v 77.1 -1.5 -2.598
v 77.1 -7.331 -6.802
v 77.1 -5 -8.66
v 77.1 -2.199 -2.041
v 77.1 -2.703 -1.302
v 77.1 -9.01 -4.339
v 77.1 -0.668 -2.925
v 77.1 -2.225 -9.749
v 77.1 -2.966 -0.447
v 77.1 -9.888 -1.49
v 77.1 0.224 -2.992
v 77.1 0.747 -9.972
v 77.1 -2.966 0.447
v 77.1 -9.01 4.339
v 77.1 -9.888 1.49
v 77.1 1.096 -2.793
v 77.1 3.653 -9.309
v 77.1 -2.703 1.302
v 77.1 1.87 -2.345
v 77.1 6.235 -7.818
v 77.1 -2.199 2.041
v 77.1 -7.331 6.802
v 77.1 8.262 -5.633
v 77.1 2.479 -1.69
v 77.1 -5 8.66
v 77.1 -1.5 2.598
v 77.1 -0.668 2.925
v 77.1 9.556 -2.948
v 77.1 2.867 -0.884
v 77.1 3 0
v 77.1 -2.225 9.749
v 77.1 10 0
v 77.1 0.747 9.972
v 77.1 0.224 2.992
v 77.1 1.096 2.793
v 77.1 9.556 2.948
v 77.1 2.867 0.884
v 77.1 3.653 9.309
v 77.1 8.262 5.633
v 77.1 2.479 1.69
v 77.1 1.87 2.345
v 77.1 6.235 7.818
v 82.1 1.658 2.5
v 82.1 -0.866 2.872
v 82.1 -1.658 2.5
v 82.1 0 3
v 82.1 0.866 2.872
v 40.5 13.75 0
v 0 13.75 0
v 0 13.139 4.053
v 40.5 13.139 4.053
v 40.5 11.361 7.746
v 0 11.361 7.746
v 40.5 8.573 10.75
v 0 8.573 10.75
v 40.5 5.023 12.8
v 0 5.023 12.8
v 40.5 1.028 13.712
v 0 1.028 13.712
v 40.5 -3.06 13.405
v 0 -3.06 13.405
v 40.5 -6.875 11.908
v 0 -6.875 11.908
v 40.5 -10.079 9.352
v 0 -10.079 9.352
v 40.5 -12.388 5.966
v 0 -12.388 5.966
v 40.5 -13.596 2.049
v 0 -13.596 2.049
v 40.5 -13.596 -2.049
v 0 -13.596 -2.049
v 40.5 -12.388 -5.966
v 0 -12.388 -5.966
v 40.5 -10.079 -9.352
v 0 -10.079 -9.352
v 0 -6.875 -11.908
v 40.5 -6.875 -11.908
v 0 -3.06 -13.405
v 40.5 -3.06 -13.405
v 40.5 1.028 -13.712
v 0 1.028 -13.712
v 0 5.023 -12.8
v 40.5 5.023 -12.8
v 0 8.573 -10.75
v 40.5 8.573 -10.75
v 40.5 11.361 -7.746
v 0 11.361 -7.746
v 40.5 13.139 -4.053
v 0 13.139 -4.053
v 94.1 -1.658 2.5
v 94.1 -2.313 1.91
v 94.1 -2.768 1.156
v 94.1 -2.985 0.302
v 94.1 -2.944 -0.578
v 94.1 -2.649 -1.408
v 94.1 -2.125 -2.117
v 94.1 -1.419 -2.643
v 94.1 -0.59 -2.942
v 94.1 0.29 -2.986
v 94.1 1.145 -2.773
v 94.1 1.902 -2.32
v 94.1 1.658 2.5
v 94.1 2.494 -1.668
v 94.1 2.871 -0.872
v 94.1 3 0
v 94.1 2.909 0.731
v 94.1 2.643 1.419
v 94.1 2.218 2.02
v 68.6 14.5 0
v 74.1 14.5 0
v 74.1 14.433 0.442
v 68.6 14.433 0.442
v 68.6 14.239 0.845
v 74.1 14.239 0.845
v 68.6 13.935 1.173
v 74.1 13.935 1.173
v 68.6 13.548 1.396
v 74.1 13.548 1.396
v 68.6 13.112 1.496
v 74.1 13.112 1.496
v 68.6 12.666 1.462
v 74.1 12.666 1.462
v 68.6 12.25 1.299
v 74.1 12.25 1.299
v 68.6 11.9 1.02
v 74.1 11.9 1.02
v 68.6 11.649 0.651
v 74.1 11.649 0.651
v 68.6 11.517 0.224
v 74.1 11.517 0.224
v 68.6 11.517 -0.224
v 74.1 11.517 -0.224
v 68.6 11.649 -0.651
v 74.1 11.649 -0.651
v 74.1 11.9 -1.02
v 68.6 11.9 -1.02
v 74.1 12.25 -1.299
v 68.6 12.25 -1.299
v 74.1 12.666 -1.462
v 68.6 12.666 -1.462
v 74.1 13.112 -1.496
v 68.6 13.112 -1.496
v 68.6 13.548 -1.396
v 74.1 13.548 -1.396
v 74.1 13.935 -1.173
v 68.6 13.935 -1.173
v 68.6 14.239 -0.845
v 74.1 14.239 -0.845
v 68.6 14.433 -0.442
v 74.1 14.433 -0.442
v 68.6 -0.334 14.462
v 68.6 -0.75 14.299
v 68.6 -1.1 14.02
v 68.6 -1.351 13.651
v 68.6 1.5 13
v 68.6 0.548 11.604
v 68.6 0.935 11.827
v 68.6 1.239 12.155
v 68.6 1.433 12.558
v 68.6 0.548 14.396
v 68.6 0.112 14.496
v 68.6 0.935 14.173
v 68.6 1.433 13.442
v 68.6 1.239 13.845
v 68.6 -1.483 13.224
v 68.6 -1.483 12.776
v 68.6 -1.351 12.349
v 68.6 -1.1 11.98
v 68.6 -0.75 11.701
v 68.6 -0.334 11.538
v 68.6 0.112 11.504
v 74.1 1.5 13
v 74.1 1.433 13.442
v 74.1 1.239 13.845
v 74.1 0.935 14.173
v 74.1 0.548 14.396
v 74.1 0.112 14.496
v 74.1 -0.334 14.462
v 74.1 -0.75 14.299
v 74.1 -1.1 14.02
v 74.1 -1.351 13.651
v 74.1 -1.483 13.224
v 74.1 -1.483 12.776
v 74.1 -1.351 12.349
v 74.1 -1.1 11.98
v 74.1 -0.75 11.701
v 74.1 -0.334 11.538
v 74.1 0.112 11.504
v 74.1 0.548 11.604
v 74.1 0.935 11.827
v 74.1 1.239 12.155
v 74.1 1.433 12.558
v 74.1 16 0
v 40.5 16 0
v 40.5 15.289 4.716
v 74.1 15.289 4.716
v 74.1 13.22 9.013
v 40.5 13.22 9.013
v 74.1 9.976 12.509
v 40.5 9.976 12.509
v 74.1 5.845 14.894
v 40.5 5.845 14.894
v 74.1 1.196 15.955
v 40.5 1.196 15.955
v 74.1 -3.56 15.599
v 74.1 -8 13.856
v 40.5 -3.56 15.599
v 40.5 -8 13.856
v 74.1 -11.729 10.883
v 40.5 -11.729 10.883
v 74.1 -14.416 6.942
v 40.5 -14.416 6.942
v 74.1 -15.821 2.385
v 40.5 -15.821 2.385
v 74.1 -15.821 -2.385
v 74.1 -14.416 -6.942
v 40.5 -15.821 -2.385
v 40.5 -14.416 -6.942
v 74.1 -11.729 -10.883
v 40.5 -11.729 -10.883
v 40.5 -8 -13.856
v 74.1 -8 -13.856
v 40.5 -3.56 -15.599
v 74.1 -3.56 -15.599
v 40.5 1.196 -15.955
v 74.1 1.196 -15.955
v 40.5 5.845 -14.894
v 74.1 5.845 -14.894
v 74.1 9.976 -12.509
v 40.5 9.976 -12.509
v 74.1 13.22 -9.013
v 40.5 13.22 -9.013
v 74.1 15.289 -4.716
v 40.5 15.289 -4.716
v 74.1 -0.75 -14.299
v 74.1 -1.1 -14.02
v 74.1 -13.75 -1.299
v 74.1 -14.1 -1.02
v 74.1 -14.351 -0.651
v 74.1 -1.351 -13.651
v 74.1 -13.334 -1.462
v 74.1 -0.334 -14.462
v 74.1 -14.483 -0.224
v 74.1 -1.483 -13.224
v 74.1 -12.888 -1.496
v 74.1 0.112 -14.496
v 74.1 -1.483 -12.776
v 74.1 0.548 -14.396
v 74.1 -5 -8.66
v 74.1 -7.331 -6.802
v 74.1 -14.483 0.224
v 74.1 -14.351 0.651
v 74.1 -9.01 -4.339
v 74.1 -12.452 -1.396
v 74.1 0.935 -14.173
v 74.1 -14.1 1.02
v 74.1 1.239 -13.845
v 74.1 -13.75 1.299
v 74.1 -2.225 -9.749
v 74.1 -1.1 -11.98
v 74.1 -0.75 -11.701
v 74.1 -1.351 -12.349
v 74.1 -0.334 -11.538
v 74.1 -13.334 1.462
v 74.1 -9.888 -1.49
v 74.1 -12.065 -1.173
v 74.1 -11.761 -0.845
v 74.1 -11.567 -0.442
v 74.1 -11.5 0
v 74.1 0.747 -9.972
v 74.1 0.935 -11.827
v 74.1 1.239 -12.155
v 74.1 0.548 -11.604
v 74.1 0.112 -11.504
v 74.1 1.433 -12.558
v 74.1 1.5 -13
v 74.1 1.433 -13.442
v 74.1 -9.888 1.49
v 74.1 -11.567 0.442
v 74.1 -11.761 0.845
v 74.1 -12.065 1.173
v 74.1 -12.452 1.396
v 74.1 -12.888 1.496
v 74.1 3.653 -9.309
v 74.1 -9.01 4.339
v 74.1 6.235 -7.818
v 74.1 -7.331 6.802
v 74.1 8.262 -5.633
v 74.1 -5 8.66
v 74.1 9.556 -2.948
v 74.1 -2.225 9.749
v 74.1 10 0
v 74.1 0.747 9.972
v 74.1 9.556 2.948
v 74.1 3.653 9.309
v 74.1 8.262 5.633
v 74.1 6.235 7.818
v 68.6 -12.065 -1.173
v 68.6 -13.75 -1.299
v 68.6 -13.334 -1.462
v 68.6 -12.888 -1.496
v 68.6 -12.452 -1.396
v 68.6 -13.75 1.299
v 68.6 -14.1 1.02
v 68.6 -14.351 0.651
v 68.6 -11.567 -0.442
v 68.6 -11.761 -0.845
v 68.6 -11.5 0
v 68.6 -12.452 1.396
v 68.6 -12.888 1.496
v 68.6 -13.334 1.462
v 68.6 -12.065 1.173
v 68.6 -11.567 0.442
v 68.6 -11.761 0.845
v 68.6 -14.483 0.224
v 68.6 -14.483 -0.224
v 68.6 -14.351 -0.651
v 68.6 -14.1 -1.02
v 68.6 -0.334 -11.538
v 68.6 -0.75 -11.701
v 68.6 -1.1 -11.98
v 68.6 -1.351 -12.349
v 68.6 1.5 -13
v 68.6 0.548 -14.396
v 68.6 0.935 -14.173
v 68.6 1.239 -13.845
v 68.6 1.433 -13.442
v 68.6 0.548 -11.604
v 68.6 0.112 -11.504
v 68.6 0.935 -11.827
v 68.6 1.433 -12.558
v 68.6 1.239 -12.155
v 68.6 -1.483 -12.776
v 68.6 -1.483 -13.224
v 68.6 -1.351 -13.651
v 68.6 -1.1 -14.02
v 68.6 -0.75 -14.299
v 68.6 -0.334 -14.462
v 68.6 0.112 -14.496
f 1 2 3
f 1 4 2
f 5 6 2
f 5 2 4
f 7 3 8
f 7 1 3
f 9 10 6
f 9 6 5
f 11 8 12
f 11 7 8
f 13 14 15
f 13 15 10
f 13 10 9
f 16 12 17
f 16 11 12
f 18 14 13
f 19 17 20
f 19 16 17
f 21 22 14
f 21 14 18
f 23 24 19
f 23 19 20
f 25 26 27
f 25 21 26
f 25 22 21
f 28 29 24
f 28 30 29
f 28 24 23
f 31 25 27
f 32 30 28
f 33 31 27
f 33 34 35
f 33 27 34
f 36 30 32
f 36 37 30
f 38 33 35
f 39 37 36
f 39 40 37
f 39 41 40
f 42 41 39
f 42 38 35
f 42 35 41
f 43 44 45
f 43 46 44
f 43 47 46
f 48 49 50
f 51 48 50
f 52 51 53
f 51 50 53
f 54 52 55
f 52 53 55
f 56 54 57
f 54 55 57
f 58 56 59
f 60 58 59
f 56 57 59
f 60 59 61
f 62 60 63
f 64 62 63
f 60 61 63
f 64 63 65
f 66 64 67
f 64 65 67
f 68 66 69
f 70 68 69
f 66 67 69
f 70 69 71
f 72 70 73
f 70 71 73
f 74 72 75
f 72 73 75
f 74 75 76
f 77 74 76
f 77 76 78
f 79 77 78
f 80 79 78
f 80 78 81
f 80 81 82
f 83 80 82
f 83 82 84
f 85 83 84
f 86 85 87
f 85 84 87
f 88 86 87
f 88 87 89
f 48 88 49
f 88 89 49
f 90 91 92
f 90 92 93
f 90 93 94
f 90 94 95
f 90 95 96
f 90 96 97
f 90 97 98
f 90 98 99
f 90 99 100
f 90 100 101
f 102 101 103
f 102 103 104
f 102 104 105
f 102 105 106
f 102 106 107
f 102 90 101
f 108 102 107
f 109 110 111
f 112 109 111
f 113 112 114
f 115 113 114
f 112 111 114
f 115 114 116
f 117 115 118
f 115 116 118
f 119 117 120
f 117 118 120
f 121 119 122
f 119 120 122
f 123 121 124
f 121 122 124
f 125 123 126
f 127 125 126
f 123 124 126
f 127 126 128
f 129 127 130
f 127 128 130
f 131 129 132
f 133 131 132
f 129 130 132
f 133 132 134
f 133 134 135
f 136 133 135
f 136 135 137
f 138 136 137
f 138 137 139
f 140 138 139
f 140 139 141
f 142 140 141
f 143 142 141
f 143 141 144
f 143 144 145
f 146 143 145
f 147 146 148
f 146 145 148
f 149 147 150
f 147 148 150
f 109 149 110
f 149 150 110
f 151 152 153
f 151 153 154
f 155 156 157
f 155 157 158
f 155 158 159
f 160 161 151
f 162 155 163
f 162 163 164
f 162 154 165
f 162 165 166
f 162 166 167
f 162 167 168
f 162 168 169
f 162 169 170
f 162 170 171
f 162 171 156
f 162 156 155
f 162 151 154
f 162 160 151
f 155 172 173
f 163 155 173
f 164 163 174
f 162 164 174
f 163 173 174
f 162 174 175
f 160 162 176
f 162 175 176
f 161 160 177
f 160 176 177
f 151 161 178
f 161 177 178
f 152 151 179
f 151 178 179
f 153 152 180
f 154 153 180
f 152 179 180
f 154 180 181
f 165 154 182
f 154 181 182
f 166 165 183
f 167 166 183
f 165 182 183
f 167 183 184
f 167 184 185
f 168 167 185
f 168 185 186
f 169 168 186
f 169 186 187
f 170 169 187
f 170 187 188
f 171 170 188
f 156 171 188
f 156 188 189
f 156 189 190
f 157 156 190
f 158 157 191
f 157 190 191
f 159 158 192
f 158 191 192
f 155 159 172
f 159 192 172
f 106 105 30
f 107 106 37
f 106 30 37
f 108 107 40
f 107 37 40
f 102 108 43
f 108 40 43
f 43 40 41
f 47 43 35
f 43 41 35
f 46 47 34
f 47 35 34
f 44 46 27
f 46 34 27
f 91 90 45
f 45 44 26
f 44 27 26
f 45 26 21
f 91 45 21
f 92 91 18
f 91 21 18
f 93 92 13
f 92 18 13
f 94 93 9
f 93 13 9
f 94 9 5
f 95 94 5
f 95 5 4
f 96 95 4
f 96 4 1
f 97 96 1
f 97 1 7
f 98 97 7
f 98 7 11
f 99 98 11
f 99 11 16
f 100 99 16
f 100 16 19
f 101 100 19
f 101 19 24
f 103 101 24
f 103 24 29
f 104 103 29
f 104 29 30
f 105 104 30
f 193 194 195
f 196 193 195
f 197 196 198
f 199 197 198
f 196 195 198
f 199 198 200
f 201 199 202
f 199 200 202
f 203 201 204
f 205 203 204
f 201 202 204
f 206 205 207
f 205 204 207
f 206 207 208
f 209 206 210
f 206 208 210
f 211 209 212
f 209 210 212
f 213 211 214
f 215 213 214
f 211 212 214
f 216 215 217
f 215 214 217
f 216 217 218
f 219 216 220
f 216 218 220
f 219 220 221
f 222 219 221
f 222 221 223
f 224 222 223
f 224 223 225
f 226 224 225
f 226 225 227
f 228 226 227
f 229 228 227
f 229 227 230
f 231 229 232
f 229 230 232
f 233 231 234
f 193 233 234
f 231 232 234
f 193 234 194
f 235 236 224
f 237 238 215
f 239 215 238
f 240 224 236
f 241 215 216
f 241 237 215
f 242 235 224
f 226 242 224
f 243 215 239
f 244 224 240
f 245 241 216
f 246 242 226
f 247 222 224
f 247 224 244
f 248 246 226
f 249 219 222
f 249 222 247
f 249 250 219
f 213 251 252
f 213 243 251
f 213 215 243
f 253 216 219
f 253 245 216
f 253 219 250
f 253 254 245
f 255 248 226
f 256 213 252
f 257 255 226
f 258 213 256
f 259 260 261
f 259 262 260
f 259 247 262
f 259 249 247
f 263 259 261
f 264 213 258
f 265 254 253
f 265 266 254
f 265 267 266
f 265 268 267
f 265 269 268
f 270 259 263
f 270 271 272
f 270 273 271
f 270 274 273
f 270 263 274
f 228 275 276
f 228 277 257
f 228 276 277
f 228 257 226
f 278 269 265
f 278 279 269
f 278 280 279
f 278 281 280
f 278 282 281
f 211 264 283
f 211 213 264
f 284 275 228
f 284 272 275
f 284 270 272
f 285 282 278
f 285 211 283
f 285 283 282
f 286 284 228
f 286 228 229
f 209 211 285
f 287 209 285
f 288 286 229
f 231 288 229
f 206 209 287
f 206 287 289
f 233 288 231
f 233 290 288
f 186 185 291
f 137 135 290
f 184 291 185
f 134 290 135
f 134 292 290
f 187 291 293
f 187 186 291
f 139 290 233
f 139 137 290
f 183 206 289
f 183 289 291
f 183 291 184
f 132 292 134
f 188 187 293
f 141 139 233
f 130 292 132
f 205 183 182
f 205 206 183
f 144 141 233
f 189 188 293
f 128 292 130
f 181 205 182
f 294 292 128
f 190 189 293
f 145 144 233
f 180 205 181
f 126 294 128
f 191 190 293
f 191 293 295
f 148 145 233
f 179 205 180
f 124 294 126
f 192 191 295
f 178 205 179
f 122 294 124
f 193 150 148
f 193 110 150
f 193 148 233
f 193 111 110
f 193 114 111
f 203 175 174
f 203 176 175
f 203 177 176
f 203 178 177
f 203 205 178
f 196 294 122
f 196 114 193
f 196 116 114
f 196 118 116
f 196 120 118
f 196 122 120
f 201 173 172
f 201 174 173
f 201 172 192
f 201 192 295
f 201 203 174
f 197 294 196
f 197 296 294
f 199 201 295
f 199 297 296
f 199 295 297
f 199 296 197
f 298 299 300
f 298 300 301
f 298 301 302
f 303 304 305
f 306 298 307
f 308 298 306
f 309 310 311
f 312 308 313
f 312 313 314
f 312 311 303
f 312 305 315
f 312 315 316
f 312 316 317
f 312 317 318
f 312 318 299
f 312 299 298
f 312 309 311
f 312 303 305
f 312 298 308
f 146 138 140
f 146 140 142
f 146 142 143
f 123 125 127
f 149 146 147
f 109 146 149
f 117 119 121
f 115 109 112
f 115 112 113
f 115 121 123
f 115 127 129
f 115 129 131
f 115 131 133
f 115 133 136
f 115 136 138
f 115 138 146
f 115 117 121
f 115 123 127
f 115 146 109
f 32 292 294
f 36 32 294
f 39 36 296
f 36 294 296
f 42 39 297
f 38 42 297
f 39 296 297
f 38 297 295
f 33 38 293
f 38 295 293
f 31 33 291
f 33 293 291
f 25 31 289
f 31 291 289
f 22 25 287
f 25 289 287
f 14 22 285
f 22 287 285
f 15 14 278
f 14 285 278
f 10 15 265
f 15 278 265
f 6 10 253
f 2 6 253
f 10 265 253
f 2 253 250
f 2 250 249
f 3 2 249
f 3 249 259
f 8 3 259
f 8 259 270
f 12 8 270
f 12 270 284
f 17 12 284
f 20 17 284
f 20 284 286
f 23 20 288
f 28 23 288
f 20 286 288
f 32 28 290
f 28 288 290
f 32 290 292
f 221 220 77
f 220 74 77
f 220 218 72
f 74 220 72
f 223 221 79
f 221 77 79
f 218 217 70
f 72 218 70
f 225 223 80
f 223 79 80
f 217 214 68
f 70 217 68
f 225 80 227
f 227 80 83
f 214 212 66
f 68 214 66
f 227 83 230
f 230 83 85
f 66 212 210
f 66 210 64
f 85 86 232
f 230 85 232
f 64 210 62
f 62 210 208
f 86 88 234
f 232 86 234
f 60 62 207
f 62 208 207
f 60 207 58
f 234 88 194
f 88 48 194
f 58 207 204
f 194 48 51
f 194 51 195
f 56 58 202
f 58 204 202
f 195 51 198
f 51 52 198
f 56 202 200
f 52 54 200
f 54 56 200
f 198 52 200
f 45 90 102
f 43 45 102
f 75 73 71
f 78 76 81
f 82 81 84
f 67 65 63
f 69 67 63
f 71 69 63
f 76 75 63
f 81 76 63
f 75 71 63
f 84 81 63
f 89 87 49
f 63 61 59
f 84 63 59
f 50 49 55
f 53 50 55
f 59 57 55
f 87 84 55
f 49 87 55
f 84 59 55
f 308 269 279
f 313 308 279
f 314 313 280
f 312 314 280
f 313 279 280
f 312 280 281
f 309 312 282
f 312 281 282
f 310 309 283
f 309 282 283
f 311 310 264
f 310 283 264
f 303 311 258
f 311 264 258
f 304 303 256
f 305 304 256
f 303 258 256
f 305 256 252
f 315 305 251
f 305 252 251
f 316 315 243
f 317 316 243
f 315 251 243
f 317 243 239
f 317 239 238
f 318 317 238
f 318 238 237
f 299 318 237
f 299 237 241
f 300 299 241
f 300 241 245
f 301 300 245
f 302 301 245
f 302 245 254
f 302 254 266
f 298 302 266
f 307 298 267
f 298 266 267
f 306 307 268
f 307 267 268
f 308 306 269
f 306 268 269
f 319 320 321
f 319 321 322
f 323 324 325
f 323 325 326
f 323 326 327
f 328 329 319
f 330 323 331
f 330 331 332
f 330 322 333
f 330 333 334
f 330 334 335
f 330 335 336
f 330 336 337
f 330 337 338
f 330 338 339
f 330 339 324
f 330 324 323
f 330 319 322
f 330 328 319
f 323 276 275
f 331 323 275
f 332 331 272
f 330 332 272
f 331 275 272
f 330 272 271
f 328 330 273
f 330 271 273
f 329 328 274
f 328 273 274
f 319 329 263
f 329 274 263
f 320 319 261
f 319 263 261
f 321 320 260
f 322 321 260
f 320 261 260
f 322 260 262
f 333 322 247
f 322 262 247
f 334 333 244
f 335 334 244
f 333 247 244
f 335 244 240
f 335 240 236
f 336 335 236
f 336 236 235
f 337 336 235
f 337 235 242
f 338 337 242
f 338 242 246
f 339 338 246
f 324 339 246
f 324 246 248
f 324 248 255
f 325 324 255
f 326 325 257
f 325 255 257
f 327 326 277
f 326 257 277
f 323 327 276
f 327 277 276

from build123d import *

# Parameters (mm, degrees)
F0_R      = 13.75
F1_DEPTH  = 40.5
F2_R      = 16
F3_DEPTH  = 33.6
F4_R      = 10
F5_DEPTH  = 3
F6_R      = 3
F7_DEPTH  = 17
F8_W      = 9.724755
F8_H      = 3.28539
F9_DEPTH  = 12
F10_R     = 1.5
F11_DEPTH = 5.5


with BuildPart() as f1:
    # F0 (on Right) → F1 (new body)
    with BuildSketch(Plane.YZ):
        Circle(F0_R)
    extrude(amount=F1_DEPTH)

    # F2 (on face) → F3 (join)
    with BuildSketch(Plane.YZ.offset(40.5)):
        Circle(F2_R)
    extrude(amount=F3_DEPTH)

    # F4 (on face) → F5 (join)
    with BuildSketch(Plane.YZ.offset(74.1)):
        Circle(F4_R)
    extrude(amount=F5_DEPTH)

    # F6 (on face) → F7 (join)
    with BuildSketch(Plane.YZ.offset(77.1)):
        Circle(F6_R)
    extrude(amount=F7_DEPTH)

    # F8 (on face) → F9 (cut)
    with BuildSketch(Plane.YZ.offset(94.1)):
        with Locations((0.085164, 4.142695)):
            Rectangle(F8_W, F8_H)
    extrude(amount=-F9_DEPTH, mode=Mode.SUBTRACT)

    # F10 (on face) → F11 (cut)
    with BuildSketch(Plane.YZ.offset(74.1)):
        with Locations((0, 13)):
            Circle(F10_R)
        with Locations((13, 0)):
            Circle(F10_R)
        with Locations((0, -13)):
            Circle(F10_R)
        with Locations((-13, 0)):
            Circle(F10_R)
    extrude(amount=-F11_DEPTH, mode=Mode.SUBTRACT)


solid = f1.part
